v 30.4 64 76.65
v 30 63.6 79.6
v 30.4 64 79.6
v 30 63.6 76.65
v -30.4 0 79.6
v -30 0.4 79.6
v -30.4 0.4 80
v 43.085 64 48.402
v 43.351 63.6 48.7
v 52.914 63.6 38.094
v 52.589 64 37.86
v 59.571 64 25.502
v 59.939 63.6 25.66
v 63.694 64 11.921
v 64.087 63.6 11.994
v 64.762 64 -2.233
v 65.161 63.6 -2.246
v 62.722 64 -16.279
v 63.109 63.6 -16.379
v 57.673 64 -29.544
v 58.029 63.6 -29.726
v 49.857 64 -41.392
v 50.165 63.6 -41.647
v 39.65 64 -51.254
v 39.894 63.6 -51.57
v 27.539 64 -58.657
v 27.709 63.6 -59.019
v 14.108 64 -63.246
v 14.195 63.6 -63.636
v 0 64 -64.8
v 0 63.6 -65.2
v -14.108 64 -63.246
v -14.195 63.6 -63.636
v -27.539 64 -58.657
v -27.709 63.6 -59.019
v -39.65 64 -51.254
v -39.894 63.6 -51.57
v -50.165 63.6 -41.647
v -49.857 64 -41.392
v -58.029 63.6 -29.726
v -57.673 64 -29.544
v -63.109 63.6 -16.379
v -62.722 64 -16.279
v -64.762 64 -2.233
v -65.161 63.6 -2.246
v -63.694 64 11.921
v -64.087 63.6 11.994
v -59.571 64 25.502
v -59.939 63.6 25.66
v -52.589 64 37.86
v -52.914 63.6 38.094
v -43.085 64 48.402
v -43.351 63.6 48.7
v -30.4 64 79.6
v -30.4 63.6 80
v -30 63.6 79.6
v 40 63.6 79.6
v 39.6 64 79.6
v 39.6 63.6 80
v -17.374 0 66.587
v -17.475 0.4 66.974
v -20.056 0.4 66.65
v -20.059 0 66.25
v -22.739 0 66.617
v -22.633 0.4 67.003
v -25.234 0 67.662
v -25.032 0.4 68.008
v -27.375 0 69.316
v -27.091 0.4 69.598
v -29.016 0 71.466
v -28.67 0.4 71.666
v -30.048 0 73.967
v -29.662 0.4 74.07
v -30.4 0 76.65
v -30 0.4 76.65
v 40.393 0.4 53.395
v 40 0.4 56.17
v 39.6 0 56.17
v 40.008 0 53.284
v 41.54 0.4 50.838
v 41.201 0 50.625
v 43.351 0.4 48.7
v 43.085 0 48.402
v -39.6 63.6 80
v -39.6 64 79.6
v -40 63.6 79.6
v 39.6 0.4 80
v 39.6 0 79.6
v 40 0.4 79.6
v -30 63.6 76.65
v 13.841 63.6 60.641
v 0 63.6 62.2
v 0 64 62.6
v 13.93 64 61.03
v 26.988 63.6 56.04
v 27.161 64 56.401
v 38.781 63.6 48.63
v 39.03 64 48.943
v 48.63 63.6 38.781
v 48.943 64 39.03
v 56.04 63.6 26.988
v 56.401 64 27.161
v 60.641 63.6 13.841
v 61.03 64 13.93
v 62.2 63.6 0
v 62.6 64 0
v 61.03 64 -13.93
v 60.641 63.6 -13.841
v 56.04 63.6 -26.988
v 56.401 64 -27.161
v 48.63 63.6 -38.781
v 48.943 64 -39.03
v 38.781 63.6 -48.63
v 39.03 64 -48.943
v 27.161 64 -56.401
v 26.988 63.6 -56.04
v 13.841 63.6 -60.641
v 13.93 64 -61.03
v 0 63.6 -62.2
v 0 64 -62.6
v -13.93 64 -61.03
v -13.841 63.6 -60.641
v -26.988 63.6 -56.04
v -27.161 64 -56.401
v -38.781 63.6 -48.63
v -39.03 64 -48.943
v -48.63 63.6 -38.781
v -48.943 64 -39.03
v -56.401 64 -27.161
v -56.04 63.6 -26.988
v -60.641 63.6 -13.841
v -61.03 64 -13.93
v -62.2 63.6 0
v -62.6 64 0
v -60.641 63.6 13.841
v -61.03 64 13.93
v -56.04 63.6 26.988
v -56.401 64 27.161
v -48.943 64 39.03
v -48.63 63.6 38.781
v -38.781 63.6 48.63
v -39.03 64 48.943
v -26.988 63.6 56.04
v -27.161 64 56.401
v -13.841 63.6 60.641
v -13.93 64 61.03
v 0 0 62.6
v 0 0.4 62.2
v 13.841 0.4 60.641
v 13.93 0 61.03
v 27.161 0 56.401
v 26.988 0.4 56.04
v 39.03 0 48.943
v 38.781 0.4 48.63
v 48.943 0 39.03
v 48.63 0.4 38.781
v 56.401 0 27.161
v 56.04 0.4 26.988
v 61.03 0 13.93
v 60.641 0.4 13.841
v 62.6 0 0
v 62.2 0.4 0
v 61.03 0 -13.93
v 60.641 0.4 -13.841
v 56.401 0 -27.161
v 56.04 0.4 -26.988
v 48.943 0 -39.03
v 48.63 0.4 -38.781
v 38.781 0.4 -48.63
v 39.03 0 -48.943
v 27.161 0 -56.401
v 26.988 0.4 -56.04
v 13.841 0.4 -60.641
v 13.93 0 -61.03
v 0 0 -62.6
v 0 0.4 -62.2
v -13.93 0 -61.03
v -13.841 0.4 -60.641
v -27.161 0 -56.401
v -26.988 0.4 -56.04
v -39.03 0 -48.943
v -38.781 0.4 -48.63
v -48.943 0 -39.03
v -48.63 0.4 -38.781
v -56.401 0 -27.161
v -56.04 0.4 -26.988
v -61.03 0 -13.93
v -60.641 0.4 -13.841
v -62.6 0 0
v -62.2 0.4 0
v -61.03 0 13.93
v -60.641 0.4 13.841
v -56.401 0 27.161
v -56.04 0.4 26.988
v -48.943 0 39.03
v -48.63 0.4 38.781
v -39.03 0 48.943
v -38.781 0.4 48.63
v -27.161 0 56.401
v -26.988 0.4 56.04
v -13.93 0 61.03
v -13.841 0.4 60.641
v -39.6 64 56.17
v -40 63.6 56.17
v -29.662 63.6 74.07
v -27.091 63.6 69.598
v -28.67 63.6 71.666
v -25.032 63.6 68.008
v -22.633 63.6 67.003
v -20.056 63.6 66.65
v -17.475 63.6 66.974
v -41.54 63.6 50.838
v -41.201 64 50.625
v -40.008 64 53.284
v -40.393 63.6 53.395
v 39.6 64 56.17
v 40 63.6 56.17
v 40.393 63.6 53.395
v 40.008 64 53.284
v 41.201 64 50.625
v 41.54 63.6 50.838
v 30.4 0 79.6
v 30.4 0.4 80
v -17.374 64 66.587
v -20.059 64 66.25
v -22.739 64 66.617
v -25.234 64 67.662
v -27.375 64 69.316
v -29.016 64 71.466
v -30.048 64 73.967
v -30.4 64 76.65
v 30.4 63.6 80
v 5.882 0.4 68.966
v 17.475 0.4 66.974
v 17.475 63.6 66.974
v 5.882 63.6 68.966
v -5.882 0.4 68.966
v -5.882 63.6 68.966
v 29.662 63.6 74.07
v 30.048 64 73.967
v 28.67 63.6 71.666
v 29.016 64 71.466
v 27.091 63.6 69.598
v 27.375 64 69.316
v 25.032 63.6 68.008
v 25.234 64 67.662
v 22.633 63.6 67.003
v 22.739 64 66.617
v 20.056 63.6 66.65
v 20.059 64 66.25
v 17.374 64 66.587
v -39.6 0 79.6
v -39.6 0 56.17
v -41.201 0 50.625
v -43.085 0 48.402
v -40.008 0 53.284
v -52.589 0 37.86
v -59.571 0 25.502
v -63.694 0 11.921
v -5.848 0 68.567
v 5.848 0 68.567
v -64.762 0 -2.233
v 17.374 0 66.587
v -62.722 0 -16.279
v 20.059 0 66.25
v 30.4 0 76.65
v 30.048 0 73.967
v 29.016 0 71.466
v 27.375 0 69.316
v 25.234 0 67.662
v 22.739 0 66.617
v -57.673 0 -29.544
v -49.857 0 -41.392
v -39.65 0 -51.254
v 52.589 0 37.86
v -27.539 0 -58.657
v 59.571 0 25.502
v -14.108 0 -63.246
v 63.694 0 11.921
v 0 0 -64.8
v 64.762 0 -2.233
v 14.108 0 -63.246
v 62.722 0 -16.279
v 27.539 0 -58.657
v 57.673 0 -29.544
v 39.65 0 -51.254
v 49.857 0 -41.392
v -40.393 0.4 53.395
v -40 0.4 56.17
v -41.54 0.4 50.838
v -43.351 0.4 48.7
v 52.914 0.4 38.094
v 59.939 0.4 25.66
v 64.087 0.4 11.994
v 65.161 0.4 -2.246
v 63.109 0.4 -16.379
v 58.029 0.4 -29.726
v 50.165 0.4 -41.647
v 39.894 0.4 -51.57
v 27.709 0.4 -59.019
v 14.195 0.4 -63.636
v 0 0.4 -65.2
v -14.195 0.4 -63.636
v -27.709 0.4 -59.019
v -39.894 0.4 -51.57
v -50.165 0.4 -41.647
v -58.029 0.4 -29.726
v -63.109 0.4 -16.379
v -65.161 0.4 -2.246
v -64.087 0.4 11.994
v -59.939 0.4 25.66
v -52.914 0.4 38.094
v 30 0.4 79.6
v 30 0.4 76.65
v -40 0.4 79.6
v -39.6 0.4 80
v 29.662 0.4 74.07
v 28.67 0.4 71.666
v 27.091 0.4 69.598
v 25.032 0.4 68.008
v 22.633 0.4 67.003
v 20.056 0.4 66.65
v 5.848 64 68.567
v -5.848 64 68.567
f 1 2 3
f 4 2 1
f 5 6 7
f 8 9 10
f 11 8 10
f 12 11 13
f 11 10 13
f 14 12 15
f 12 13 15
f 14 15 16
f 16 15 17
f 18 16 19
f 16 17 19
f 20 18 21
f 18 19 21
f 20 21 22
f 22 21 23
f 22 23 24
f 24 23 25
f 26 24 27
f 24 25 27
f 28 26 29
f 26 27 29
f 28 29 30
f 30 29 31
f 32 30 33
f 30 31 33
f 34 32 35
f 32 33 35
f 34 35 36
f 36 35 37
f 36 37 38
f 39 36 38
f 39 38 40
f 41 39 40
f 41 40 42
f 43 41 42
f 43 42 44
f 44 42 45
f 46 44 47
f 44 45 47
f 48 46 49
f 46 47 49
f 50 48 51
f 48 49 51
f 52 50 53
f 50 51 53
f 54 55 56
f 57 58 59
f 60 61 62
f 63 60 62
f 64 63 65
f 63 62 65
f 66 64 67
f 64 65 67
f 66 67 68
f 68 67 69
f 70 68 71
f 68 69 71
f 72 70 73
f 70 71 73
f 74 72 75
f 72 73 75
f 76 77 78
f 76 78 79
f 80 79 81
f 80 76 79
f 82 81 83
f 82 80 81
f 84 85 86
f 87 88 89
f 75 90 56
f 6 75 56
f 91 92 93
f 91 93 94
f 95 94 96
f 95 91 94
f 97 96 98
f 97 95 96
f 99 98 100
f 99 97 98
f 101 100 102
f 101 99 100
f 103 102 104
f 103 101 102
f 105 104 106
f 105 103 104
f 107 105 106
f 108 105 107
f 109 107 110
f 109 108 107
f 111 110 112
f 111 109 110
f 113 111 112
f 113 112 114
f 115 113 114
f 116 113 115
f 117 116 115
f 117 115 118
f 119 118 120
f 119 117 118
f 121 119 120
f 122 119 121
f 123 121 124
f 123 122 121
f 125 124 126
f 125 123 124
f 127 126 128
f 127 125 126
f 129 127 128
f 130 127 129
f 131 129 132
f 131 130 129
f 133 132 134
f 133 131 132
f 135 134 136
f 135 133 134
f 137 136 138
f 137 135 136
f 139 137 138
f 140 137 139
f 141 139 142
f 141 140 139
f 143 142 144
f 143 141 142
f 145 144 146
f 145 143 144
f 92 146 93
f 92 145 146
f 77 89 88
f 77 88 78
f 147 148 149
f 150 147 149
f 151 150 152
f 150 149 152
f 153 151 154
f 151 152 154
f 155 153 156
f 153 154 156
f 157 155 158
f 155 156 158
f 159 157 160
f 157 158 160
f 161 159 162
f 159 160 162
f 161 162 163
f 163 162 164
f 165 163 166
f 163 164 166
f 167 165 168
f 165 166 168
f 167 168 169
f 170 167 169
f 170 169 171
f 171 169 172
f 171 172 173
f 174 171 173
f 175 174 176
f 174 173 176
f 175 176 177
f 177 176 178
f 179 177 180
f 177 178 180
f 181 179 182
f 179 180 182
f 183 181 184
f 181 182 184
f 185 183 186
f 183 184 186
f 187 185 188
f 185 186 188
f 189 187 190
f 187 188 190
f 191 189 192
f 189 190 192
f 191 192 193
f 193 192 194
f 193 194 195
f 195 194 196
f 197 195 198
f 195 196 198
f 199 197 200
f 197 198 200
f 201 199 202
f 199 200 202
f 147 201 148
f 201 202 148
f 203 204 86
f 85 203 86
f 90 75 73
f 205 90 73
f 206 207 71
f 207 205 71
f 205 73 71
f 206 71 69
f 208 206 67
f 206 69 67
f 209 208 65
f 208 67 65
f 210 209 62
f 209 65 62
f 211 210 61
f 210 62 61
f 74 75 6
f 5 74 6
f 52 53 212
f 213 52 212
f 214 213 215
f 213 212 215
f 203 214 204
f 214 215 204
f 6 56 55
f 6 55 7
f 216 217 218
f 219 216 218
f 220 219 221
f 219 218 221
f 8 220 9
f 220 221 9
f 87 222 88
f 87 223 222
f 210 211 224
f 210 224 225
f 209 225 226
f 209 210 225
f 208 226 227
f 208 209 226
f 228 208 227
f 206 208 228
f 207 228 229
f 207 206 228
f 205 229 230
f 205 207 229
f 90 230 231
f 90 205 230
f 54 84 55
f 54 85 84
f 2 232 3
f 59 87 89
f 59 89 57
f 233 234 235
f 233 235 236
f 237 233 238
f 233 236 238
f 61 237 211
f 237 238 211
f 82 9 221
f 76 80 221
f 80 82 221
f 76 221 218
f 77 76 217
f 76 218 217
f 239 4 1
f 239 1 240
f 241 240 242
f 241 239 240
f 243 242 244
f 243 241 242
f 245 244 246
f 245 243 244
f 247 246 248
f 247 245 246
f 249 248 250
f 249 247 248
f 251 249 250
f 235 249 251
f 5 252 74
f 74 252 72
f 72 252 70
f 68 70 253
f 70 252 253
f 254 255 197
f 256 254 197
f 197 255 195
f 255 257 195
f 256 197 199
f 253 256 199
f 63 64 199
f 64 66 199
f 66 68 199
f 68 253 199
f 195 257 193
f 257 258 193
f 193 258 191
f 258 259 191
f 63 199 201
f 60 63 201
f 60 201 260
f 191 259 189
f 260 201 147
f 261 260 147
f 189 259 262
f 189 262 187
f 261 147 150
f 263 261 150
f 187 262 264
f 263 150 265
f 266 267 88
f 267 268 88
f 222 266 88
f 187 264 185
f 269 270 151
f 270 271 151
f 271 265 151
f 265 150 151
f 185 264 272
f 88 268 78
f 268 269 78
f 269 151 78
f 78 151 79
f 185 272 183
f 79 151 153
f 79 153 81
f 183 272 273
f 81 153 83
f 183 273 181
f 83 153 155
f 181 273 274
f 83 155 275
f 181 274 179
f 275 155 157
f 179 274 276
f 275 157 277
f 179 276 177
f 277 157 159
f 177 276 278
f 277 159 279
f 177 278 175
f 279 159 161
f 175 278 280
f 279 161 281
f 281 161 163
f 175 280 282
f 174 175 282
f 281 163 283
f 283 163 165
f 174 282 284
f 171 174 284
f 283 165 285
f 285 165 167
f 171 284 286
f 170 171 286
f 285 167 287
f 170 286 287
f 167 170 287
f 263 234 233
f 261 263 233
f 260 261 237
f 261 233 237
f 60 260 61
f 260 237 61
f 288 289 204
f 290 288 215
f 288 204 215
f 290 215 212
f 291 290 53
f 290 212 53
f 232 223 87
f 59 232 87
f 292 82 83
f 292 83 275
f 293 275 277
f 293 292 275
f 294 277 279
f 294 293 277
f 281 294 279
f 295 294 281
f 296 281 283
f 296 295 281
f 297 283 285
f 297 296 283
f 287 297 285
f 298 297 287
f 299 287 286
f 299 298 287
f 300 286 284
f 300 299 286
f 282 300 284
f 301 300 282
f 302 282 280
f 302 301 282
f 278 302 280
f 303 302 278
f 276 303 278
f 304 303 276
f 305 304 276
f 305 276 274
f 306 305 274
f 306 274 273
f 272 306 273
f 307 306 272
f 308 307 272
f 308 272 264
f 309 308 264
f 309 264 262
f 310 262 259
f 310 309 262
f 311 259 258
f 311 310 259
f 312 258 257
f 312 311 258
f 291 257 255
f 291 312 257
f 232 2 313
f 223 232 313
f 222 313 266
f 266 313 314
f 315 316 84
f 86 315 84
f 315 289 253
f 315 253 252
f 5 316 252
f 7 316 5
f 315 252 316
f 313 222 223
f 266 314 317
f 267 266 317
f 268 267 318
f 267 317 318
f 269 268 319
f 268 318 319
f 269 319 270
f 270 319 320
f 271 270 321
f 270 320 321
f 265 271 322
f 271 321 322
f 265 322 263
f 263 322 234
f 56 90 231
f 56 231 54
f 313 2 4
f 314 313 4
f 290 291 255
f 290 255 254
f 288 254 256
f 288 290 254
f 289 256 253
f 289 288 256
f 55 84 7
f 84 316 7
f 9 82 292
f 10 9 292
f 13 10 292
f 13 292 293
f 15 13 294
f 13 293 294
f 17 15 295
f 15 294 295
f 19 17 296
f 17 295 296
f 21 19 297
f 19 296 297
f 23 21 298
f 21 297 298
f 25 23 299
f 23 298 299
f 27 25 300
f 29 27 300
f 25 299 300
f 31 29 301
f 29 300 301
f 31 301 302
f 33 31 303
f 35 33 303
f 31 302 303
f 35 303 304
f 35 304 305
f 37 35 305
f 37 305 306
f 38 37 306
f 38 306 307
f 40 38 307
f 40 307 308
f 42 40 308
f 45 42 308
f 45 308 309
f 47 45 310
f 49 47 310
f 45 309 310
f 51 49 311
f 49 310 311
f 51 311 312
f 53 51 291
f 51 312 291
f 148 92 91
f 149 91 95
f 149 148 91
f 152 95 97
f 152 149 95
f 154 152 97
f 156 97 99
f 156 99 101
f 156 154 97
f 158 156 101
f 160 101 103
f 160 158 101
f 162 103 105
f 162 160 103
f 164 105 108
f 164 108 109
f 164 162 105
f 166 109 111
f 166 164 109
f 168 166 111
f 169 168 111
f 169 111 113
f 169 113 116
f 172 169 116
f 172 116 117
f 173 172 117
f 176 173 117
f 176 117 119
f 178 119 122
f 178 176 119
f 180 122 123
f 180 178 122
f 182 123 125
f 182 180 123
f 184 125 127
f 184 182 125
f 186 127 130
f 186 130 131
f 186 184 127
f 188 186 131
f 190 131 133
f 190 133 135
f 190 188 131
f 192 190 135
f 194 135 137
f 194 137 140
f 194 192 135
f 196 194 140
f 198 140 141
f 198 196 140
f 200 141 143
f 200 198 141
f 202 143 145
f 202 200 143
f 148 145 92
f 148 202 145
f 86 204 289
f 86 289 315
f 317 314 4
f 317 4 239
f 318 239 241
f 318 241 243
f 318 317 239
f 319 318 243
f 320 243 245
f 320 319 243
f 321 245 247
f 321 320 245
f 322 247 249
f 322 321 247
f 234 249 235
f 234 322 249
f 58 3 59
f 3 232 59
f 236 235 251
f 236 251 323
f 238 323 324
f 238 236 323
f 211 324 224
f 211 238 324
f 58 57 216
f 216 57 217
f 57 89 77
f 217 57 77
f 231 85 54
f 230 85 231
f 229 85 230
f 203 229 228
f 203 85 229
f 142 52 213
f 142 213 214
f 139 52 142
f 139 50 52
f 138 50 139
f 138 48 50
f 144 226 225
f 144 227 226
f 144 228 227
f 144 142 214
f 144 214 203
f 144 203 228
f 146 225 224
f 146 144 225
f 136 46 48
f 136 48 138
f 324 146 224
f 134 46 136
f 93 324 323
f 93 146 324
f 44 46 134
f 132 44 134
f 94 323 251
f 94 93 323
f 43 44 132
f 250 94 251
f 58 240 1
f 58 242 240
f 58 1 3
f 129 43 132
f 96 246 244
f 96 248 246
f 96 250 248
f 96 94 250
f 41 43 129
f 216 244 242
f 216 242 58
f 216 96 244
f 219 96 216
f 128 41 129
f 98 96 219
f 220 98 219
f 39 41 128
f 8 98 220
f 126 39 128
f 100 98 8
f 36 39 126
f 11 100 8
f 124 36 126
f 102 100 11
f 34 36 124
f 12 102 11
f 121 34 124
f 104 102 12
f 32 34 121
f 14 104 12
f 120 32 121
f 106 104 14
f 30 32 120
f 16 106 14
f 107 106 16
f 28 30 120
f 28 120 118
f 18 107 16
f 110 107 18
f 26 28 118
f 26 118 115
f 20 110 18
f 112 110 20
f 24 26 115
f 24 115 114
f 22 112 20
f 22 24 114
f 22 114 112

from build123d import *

# Parameters (mm, degrees)
SKETCH_1_R          = 62.2
EXTRUDE_2_DEPTH     = 64
CUT_EXTRUDE_1_DEPTH = 122.437391276
FILLET_1_R          = 10
CHAMFER_1_SIZE      = 0.4


with BuildPart() as part:
    # 草图1 → 凸台-拉伸2 (new body)
    with BuildSketch(Plane(origin=(0, 0, 0), x_dir=(1, 0, 0), z_dir=(0, 1, 0))):
        with BuildLine():
            Line((-40, -51.488251087), (-40, -80))
            Line((-40, -80), (40, -80))
            Line((40, -80), (40, -51.488251087))
            ThreePointArc((40, -51.488251087), (0, 65.2), (-40, -51.488251087))
        make_face()
        with Locations(Location((0, 0, 0), (0, 0, 270))):
            Circle(SKETCH_1_R, mode=Mode.SUBTRACT)
    extrude(amount=EXTRUDE_2_DEPTH)

    # 草图2 → 切除-拉伸1 (cut, through all)
    with BuildSketch(Plane(origin=(0, 64, 0), x_dir=(1, 0, 0), z_dir=(0, 1, 0))):
        with BuildLine():
            Line((-30, -80), (30, -80))
            Line((30, -80), (30, -62.376598176))
            ThreePointArc((30, -62.376598176), (0, -69.215894128), (-30, -62.376598176))
            Line((-30, -62.376598176), (-30, -80))
        make_face()
    extrude(amount=-CUT_EXTRUDE_1_DEPTH, mode=Mode.SUBTRACT)

    # 圆角1
    fillet_1_edges = [part.edges().sort_by_distance(p)[0] for p in [
        (-30, 32, 62.376598176),
        (30, 32, 62.376598176),
        (-40, 32, 51.488251087),
        (40, 32, 51.488251087),
    ]]
    fillet(fillet_1_edges, radius=FILLET_1_R)

    # 倒角1
    chamfer_1_edges = [part.edges().sort_by_distance(p)[0] for p in [
        (0, 0, -62.2),
        (0, 64, -62.2),
        (-35, 64, 80),
        (35, 0, 80),
        (35, 64, 80),
        (-30, 32, 80),
        (30, 0, 78.324789245),
        (30, 32, 80),
        (30, 64, 78.324789245),
        (-30, 64, 78.324789245),
        (-30, 0, 78.324789245),
        (0, 64, 69.215894128),
        (0, 0, 69.215894128),
        (0, 0, -65.2),
        (0, 64, -65.2),
        (-40, 0, 68.084871372),
        (-40, 64, 68.084871372),
        (-26.113613559, 64, 68.736062883),
        (-26.113613559, 0, 68.736062883),
        (26.113613559, 64, 68.736062883),
        (26.113613559, 0, 68.736062883),
        (40.876147697, 0, 52.076416573),
        (40.876147697, 64, 52.076416573),
        (-40.876147697, 0, 52.076416573),
        (-40.876147697, 64, 52.076416573),
        (40, 64, 68.084871372),
        (-35, 0, 80),
        (40, 0, 68.084871372),
        (40, 32, 80),
        (-40, 32, 80),
    ]]
    chamfer(chamfer_1_edges, length=CHAMFER_1_SIZE)


solid = part.part
